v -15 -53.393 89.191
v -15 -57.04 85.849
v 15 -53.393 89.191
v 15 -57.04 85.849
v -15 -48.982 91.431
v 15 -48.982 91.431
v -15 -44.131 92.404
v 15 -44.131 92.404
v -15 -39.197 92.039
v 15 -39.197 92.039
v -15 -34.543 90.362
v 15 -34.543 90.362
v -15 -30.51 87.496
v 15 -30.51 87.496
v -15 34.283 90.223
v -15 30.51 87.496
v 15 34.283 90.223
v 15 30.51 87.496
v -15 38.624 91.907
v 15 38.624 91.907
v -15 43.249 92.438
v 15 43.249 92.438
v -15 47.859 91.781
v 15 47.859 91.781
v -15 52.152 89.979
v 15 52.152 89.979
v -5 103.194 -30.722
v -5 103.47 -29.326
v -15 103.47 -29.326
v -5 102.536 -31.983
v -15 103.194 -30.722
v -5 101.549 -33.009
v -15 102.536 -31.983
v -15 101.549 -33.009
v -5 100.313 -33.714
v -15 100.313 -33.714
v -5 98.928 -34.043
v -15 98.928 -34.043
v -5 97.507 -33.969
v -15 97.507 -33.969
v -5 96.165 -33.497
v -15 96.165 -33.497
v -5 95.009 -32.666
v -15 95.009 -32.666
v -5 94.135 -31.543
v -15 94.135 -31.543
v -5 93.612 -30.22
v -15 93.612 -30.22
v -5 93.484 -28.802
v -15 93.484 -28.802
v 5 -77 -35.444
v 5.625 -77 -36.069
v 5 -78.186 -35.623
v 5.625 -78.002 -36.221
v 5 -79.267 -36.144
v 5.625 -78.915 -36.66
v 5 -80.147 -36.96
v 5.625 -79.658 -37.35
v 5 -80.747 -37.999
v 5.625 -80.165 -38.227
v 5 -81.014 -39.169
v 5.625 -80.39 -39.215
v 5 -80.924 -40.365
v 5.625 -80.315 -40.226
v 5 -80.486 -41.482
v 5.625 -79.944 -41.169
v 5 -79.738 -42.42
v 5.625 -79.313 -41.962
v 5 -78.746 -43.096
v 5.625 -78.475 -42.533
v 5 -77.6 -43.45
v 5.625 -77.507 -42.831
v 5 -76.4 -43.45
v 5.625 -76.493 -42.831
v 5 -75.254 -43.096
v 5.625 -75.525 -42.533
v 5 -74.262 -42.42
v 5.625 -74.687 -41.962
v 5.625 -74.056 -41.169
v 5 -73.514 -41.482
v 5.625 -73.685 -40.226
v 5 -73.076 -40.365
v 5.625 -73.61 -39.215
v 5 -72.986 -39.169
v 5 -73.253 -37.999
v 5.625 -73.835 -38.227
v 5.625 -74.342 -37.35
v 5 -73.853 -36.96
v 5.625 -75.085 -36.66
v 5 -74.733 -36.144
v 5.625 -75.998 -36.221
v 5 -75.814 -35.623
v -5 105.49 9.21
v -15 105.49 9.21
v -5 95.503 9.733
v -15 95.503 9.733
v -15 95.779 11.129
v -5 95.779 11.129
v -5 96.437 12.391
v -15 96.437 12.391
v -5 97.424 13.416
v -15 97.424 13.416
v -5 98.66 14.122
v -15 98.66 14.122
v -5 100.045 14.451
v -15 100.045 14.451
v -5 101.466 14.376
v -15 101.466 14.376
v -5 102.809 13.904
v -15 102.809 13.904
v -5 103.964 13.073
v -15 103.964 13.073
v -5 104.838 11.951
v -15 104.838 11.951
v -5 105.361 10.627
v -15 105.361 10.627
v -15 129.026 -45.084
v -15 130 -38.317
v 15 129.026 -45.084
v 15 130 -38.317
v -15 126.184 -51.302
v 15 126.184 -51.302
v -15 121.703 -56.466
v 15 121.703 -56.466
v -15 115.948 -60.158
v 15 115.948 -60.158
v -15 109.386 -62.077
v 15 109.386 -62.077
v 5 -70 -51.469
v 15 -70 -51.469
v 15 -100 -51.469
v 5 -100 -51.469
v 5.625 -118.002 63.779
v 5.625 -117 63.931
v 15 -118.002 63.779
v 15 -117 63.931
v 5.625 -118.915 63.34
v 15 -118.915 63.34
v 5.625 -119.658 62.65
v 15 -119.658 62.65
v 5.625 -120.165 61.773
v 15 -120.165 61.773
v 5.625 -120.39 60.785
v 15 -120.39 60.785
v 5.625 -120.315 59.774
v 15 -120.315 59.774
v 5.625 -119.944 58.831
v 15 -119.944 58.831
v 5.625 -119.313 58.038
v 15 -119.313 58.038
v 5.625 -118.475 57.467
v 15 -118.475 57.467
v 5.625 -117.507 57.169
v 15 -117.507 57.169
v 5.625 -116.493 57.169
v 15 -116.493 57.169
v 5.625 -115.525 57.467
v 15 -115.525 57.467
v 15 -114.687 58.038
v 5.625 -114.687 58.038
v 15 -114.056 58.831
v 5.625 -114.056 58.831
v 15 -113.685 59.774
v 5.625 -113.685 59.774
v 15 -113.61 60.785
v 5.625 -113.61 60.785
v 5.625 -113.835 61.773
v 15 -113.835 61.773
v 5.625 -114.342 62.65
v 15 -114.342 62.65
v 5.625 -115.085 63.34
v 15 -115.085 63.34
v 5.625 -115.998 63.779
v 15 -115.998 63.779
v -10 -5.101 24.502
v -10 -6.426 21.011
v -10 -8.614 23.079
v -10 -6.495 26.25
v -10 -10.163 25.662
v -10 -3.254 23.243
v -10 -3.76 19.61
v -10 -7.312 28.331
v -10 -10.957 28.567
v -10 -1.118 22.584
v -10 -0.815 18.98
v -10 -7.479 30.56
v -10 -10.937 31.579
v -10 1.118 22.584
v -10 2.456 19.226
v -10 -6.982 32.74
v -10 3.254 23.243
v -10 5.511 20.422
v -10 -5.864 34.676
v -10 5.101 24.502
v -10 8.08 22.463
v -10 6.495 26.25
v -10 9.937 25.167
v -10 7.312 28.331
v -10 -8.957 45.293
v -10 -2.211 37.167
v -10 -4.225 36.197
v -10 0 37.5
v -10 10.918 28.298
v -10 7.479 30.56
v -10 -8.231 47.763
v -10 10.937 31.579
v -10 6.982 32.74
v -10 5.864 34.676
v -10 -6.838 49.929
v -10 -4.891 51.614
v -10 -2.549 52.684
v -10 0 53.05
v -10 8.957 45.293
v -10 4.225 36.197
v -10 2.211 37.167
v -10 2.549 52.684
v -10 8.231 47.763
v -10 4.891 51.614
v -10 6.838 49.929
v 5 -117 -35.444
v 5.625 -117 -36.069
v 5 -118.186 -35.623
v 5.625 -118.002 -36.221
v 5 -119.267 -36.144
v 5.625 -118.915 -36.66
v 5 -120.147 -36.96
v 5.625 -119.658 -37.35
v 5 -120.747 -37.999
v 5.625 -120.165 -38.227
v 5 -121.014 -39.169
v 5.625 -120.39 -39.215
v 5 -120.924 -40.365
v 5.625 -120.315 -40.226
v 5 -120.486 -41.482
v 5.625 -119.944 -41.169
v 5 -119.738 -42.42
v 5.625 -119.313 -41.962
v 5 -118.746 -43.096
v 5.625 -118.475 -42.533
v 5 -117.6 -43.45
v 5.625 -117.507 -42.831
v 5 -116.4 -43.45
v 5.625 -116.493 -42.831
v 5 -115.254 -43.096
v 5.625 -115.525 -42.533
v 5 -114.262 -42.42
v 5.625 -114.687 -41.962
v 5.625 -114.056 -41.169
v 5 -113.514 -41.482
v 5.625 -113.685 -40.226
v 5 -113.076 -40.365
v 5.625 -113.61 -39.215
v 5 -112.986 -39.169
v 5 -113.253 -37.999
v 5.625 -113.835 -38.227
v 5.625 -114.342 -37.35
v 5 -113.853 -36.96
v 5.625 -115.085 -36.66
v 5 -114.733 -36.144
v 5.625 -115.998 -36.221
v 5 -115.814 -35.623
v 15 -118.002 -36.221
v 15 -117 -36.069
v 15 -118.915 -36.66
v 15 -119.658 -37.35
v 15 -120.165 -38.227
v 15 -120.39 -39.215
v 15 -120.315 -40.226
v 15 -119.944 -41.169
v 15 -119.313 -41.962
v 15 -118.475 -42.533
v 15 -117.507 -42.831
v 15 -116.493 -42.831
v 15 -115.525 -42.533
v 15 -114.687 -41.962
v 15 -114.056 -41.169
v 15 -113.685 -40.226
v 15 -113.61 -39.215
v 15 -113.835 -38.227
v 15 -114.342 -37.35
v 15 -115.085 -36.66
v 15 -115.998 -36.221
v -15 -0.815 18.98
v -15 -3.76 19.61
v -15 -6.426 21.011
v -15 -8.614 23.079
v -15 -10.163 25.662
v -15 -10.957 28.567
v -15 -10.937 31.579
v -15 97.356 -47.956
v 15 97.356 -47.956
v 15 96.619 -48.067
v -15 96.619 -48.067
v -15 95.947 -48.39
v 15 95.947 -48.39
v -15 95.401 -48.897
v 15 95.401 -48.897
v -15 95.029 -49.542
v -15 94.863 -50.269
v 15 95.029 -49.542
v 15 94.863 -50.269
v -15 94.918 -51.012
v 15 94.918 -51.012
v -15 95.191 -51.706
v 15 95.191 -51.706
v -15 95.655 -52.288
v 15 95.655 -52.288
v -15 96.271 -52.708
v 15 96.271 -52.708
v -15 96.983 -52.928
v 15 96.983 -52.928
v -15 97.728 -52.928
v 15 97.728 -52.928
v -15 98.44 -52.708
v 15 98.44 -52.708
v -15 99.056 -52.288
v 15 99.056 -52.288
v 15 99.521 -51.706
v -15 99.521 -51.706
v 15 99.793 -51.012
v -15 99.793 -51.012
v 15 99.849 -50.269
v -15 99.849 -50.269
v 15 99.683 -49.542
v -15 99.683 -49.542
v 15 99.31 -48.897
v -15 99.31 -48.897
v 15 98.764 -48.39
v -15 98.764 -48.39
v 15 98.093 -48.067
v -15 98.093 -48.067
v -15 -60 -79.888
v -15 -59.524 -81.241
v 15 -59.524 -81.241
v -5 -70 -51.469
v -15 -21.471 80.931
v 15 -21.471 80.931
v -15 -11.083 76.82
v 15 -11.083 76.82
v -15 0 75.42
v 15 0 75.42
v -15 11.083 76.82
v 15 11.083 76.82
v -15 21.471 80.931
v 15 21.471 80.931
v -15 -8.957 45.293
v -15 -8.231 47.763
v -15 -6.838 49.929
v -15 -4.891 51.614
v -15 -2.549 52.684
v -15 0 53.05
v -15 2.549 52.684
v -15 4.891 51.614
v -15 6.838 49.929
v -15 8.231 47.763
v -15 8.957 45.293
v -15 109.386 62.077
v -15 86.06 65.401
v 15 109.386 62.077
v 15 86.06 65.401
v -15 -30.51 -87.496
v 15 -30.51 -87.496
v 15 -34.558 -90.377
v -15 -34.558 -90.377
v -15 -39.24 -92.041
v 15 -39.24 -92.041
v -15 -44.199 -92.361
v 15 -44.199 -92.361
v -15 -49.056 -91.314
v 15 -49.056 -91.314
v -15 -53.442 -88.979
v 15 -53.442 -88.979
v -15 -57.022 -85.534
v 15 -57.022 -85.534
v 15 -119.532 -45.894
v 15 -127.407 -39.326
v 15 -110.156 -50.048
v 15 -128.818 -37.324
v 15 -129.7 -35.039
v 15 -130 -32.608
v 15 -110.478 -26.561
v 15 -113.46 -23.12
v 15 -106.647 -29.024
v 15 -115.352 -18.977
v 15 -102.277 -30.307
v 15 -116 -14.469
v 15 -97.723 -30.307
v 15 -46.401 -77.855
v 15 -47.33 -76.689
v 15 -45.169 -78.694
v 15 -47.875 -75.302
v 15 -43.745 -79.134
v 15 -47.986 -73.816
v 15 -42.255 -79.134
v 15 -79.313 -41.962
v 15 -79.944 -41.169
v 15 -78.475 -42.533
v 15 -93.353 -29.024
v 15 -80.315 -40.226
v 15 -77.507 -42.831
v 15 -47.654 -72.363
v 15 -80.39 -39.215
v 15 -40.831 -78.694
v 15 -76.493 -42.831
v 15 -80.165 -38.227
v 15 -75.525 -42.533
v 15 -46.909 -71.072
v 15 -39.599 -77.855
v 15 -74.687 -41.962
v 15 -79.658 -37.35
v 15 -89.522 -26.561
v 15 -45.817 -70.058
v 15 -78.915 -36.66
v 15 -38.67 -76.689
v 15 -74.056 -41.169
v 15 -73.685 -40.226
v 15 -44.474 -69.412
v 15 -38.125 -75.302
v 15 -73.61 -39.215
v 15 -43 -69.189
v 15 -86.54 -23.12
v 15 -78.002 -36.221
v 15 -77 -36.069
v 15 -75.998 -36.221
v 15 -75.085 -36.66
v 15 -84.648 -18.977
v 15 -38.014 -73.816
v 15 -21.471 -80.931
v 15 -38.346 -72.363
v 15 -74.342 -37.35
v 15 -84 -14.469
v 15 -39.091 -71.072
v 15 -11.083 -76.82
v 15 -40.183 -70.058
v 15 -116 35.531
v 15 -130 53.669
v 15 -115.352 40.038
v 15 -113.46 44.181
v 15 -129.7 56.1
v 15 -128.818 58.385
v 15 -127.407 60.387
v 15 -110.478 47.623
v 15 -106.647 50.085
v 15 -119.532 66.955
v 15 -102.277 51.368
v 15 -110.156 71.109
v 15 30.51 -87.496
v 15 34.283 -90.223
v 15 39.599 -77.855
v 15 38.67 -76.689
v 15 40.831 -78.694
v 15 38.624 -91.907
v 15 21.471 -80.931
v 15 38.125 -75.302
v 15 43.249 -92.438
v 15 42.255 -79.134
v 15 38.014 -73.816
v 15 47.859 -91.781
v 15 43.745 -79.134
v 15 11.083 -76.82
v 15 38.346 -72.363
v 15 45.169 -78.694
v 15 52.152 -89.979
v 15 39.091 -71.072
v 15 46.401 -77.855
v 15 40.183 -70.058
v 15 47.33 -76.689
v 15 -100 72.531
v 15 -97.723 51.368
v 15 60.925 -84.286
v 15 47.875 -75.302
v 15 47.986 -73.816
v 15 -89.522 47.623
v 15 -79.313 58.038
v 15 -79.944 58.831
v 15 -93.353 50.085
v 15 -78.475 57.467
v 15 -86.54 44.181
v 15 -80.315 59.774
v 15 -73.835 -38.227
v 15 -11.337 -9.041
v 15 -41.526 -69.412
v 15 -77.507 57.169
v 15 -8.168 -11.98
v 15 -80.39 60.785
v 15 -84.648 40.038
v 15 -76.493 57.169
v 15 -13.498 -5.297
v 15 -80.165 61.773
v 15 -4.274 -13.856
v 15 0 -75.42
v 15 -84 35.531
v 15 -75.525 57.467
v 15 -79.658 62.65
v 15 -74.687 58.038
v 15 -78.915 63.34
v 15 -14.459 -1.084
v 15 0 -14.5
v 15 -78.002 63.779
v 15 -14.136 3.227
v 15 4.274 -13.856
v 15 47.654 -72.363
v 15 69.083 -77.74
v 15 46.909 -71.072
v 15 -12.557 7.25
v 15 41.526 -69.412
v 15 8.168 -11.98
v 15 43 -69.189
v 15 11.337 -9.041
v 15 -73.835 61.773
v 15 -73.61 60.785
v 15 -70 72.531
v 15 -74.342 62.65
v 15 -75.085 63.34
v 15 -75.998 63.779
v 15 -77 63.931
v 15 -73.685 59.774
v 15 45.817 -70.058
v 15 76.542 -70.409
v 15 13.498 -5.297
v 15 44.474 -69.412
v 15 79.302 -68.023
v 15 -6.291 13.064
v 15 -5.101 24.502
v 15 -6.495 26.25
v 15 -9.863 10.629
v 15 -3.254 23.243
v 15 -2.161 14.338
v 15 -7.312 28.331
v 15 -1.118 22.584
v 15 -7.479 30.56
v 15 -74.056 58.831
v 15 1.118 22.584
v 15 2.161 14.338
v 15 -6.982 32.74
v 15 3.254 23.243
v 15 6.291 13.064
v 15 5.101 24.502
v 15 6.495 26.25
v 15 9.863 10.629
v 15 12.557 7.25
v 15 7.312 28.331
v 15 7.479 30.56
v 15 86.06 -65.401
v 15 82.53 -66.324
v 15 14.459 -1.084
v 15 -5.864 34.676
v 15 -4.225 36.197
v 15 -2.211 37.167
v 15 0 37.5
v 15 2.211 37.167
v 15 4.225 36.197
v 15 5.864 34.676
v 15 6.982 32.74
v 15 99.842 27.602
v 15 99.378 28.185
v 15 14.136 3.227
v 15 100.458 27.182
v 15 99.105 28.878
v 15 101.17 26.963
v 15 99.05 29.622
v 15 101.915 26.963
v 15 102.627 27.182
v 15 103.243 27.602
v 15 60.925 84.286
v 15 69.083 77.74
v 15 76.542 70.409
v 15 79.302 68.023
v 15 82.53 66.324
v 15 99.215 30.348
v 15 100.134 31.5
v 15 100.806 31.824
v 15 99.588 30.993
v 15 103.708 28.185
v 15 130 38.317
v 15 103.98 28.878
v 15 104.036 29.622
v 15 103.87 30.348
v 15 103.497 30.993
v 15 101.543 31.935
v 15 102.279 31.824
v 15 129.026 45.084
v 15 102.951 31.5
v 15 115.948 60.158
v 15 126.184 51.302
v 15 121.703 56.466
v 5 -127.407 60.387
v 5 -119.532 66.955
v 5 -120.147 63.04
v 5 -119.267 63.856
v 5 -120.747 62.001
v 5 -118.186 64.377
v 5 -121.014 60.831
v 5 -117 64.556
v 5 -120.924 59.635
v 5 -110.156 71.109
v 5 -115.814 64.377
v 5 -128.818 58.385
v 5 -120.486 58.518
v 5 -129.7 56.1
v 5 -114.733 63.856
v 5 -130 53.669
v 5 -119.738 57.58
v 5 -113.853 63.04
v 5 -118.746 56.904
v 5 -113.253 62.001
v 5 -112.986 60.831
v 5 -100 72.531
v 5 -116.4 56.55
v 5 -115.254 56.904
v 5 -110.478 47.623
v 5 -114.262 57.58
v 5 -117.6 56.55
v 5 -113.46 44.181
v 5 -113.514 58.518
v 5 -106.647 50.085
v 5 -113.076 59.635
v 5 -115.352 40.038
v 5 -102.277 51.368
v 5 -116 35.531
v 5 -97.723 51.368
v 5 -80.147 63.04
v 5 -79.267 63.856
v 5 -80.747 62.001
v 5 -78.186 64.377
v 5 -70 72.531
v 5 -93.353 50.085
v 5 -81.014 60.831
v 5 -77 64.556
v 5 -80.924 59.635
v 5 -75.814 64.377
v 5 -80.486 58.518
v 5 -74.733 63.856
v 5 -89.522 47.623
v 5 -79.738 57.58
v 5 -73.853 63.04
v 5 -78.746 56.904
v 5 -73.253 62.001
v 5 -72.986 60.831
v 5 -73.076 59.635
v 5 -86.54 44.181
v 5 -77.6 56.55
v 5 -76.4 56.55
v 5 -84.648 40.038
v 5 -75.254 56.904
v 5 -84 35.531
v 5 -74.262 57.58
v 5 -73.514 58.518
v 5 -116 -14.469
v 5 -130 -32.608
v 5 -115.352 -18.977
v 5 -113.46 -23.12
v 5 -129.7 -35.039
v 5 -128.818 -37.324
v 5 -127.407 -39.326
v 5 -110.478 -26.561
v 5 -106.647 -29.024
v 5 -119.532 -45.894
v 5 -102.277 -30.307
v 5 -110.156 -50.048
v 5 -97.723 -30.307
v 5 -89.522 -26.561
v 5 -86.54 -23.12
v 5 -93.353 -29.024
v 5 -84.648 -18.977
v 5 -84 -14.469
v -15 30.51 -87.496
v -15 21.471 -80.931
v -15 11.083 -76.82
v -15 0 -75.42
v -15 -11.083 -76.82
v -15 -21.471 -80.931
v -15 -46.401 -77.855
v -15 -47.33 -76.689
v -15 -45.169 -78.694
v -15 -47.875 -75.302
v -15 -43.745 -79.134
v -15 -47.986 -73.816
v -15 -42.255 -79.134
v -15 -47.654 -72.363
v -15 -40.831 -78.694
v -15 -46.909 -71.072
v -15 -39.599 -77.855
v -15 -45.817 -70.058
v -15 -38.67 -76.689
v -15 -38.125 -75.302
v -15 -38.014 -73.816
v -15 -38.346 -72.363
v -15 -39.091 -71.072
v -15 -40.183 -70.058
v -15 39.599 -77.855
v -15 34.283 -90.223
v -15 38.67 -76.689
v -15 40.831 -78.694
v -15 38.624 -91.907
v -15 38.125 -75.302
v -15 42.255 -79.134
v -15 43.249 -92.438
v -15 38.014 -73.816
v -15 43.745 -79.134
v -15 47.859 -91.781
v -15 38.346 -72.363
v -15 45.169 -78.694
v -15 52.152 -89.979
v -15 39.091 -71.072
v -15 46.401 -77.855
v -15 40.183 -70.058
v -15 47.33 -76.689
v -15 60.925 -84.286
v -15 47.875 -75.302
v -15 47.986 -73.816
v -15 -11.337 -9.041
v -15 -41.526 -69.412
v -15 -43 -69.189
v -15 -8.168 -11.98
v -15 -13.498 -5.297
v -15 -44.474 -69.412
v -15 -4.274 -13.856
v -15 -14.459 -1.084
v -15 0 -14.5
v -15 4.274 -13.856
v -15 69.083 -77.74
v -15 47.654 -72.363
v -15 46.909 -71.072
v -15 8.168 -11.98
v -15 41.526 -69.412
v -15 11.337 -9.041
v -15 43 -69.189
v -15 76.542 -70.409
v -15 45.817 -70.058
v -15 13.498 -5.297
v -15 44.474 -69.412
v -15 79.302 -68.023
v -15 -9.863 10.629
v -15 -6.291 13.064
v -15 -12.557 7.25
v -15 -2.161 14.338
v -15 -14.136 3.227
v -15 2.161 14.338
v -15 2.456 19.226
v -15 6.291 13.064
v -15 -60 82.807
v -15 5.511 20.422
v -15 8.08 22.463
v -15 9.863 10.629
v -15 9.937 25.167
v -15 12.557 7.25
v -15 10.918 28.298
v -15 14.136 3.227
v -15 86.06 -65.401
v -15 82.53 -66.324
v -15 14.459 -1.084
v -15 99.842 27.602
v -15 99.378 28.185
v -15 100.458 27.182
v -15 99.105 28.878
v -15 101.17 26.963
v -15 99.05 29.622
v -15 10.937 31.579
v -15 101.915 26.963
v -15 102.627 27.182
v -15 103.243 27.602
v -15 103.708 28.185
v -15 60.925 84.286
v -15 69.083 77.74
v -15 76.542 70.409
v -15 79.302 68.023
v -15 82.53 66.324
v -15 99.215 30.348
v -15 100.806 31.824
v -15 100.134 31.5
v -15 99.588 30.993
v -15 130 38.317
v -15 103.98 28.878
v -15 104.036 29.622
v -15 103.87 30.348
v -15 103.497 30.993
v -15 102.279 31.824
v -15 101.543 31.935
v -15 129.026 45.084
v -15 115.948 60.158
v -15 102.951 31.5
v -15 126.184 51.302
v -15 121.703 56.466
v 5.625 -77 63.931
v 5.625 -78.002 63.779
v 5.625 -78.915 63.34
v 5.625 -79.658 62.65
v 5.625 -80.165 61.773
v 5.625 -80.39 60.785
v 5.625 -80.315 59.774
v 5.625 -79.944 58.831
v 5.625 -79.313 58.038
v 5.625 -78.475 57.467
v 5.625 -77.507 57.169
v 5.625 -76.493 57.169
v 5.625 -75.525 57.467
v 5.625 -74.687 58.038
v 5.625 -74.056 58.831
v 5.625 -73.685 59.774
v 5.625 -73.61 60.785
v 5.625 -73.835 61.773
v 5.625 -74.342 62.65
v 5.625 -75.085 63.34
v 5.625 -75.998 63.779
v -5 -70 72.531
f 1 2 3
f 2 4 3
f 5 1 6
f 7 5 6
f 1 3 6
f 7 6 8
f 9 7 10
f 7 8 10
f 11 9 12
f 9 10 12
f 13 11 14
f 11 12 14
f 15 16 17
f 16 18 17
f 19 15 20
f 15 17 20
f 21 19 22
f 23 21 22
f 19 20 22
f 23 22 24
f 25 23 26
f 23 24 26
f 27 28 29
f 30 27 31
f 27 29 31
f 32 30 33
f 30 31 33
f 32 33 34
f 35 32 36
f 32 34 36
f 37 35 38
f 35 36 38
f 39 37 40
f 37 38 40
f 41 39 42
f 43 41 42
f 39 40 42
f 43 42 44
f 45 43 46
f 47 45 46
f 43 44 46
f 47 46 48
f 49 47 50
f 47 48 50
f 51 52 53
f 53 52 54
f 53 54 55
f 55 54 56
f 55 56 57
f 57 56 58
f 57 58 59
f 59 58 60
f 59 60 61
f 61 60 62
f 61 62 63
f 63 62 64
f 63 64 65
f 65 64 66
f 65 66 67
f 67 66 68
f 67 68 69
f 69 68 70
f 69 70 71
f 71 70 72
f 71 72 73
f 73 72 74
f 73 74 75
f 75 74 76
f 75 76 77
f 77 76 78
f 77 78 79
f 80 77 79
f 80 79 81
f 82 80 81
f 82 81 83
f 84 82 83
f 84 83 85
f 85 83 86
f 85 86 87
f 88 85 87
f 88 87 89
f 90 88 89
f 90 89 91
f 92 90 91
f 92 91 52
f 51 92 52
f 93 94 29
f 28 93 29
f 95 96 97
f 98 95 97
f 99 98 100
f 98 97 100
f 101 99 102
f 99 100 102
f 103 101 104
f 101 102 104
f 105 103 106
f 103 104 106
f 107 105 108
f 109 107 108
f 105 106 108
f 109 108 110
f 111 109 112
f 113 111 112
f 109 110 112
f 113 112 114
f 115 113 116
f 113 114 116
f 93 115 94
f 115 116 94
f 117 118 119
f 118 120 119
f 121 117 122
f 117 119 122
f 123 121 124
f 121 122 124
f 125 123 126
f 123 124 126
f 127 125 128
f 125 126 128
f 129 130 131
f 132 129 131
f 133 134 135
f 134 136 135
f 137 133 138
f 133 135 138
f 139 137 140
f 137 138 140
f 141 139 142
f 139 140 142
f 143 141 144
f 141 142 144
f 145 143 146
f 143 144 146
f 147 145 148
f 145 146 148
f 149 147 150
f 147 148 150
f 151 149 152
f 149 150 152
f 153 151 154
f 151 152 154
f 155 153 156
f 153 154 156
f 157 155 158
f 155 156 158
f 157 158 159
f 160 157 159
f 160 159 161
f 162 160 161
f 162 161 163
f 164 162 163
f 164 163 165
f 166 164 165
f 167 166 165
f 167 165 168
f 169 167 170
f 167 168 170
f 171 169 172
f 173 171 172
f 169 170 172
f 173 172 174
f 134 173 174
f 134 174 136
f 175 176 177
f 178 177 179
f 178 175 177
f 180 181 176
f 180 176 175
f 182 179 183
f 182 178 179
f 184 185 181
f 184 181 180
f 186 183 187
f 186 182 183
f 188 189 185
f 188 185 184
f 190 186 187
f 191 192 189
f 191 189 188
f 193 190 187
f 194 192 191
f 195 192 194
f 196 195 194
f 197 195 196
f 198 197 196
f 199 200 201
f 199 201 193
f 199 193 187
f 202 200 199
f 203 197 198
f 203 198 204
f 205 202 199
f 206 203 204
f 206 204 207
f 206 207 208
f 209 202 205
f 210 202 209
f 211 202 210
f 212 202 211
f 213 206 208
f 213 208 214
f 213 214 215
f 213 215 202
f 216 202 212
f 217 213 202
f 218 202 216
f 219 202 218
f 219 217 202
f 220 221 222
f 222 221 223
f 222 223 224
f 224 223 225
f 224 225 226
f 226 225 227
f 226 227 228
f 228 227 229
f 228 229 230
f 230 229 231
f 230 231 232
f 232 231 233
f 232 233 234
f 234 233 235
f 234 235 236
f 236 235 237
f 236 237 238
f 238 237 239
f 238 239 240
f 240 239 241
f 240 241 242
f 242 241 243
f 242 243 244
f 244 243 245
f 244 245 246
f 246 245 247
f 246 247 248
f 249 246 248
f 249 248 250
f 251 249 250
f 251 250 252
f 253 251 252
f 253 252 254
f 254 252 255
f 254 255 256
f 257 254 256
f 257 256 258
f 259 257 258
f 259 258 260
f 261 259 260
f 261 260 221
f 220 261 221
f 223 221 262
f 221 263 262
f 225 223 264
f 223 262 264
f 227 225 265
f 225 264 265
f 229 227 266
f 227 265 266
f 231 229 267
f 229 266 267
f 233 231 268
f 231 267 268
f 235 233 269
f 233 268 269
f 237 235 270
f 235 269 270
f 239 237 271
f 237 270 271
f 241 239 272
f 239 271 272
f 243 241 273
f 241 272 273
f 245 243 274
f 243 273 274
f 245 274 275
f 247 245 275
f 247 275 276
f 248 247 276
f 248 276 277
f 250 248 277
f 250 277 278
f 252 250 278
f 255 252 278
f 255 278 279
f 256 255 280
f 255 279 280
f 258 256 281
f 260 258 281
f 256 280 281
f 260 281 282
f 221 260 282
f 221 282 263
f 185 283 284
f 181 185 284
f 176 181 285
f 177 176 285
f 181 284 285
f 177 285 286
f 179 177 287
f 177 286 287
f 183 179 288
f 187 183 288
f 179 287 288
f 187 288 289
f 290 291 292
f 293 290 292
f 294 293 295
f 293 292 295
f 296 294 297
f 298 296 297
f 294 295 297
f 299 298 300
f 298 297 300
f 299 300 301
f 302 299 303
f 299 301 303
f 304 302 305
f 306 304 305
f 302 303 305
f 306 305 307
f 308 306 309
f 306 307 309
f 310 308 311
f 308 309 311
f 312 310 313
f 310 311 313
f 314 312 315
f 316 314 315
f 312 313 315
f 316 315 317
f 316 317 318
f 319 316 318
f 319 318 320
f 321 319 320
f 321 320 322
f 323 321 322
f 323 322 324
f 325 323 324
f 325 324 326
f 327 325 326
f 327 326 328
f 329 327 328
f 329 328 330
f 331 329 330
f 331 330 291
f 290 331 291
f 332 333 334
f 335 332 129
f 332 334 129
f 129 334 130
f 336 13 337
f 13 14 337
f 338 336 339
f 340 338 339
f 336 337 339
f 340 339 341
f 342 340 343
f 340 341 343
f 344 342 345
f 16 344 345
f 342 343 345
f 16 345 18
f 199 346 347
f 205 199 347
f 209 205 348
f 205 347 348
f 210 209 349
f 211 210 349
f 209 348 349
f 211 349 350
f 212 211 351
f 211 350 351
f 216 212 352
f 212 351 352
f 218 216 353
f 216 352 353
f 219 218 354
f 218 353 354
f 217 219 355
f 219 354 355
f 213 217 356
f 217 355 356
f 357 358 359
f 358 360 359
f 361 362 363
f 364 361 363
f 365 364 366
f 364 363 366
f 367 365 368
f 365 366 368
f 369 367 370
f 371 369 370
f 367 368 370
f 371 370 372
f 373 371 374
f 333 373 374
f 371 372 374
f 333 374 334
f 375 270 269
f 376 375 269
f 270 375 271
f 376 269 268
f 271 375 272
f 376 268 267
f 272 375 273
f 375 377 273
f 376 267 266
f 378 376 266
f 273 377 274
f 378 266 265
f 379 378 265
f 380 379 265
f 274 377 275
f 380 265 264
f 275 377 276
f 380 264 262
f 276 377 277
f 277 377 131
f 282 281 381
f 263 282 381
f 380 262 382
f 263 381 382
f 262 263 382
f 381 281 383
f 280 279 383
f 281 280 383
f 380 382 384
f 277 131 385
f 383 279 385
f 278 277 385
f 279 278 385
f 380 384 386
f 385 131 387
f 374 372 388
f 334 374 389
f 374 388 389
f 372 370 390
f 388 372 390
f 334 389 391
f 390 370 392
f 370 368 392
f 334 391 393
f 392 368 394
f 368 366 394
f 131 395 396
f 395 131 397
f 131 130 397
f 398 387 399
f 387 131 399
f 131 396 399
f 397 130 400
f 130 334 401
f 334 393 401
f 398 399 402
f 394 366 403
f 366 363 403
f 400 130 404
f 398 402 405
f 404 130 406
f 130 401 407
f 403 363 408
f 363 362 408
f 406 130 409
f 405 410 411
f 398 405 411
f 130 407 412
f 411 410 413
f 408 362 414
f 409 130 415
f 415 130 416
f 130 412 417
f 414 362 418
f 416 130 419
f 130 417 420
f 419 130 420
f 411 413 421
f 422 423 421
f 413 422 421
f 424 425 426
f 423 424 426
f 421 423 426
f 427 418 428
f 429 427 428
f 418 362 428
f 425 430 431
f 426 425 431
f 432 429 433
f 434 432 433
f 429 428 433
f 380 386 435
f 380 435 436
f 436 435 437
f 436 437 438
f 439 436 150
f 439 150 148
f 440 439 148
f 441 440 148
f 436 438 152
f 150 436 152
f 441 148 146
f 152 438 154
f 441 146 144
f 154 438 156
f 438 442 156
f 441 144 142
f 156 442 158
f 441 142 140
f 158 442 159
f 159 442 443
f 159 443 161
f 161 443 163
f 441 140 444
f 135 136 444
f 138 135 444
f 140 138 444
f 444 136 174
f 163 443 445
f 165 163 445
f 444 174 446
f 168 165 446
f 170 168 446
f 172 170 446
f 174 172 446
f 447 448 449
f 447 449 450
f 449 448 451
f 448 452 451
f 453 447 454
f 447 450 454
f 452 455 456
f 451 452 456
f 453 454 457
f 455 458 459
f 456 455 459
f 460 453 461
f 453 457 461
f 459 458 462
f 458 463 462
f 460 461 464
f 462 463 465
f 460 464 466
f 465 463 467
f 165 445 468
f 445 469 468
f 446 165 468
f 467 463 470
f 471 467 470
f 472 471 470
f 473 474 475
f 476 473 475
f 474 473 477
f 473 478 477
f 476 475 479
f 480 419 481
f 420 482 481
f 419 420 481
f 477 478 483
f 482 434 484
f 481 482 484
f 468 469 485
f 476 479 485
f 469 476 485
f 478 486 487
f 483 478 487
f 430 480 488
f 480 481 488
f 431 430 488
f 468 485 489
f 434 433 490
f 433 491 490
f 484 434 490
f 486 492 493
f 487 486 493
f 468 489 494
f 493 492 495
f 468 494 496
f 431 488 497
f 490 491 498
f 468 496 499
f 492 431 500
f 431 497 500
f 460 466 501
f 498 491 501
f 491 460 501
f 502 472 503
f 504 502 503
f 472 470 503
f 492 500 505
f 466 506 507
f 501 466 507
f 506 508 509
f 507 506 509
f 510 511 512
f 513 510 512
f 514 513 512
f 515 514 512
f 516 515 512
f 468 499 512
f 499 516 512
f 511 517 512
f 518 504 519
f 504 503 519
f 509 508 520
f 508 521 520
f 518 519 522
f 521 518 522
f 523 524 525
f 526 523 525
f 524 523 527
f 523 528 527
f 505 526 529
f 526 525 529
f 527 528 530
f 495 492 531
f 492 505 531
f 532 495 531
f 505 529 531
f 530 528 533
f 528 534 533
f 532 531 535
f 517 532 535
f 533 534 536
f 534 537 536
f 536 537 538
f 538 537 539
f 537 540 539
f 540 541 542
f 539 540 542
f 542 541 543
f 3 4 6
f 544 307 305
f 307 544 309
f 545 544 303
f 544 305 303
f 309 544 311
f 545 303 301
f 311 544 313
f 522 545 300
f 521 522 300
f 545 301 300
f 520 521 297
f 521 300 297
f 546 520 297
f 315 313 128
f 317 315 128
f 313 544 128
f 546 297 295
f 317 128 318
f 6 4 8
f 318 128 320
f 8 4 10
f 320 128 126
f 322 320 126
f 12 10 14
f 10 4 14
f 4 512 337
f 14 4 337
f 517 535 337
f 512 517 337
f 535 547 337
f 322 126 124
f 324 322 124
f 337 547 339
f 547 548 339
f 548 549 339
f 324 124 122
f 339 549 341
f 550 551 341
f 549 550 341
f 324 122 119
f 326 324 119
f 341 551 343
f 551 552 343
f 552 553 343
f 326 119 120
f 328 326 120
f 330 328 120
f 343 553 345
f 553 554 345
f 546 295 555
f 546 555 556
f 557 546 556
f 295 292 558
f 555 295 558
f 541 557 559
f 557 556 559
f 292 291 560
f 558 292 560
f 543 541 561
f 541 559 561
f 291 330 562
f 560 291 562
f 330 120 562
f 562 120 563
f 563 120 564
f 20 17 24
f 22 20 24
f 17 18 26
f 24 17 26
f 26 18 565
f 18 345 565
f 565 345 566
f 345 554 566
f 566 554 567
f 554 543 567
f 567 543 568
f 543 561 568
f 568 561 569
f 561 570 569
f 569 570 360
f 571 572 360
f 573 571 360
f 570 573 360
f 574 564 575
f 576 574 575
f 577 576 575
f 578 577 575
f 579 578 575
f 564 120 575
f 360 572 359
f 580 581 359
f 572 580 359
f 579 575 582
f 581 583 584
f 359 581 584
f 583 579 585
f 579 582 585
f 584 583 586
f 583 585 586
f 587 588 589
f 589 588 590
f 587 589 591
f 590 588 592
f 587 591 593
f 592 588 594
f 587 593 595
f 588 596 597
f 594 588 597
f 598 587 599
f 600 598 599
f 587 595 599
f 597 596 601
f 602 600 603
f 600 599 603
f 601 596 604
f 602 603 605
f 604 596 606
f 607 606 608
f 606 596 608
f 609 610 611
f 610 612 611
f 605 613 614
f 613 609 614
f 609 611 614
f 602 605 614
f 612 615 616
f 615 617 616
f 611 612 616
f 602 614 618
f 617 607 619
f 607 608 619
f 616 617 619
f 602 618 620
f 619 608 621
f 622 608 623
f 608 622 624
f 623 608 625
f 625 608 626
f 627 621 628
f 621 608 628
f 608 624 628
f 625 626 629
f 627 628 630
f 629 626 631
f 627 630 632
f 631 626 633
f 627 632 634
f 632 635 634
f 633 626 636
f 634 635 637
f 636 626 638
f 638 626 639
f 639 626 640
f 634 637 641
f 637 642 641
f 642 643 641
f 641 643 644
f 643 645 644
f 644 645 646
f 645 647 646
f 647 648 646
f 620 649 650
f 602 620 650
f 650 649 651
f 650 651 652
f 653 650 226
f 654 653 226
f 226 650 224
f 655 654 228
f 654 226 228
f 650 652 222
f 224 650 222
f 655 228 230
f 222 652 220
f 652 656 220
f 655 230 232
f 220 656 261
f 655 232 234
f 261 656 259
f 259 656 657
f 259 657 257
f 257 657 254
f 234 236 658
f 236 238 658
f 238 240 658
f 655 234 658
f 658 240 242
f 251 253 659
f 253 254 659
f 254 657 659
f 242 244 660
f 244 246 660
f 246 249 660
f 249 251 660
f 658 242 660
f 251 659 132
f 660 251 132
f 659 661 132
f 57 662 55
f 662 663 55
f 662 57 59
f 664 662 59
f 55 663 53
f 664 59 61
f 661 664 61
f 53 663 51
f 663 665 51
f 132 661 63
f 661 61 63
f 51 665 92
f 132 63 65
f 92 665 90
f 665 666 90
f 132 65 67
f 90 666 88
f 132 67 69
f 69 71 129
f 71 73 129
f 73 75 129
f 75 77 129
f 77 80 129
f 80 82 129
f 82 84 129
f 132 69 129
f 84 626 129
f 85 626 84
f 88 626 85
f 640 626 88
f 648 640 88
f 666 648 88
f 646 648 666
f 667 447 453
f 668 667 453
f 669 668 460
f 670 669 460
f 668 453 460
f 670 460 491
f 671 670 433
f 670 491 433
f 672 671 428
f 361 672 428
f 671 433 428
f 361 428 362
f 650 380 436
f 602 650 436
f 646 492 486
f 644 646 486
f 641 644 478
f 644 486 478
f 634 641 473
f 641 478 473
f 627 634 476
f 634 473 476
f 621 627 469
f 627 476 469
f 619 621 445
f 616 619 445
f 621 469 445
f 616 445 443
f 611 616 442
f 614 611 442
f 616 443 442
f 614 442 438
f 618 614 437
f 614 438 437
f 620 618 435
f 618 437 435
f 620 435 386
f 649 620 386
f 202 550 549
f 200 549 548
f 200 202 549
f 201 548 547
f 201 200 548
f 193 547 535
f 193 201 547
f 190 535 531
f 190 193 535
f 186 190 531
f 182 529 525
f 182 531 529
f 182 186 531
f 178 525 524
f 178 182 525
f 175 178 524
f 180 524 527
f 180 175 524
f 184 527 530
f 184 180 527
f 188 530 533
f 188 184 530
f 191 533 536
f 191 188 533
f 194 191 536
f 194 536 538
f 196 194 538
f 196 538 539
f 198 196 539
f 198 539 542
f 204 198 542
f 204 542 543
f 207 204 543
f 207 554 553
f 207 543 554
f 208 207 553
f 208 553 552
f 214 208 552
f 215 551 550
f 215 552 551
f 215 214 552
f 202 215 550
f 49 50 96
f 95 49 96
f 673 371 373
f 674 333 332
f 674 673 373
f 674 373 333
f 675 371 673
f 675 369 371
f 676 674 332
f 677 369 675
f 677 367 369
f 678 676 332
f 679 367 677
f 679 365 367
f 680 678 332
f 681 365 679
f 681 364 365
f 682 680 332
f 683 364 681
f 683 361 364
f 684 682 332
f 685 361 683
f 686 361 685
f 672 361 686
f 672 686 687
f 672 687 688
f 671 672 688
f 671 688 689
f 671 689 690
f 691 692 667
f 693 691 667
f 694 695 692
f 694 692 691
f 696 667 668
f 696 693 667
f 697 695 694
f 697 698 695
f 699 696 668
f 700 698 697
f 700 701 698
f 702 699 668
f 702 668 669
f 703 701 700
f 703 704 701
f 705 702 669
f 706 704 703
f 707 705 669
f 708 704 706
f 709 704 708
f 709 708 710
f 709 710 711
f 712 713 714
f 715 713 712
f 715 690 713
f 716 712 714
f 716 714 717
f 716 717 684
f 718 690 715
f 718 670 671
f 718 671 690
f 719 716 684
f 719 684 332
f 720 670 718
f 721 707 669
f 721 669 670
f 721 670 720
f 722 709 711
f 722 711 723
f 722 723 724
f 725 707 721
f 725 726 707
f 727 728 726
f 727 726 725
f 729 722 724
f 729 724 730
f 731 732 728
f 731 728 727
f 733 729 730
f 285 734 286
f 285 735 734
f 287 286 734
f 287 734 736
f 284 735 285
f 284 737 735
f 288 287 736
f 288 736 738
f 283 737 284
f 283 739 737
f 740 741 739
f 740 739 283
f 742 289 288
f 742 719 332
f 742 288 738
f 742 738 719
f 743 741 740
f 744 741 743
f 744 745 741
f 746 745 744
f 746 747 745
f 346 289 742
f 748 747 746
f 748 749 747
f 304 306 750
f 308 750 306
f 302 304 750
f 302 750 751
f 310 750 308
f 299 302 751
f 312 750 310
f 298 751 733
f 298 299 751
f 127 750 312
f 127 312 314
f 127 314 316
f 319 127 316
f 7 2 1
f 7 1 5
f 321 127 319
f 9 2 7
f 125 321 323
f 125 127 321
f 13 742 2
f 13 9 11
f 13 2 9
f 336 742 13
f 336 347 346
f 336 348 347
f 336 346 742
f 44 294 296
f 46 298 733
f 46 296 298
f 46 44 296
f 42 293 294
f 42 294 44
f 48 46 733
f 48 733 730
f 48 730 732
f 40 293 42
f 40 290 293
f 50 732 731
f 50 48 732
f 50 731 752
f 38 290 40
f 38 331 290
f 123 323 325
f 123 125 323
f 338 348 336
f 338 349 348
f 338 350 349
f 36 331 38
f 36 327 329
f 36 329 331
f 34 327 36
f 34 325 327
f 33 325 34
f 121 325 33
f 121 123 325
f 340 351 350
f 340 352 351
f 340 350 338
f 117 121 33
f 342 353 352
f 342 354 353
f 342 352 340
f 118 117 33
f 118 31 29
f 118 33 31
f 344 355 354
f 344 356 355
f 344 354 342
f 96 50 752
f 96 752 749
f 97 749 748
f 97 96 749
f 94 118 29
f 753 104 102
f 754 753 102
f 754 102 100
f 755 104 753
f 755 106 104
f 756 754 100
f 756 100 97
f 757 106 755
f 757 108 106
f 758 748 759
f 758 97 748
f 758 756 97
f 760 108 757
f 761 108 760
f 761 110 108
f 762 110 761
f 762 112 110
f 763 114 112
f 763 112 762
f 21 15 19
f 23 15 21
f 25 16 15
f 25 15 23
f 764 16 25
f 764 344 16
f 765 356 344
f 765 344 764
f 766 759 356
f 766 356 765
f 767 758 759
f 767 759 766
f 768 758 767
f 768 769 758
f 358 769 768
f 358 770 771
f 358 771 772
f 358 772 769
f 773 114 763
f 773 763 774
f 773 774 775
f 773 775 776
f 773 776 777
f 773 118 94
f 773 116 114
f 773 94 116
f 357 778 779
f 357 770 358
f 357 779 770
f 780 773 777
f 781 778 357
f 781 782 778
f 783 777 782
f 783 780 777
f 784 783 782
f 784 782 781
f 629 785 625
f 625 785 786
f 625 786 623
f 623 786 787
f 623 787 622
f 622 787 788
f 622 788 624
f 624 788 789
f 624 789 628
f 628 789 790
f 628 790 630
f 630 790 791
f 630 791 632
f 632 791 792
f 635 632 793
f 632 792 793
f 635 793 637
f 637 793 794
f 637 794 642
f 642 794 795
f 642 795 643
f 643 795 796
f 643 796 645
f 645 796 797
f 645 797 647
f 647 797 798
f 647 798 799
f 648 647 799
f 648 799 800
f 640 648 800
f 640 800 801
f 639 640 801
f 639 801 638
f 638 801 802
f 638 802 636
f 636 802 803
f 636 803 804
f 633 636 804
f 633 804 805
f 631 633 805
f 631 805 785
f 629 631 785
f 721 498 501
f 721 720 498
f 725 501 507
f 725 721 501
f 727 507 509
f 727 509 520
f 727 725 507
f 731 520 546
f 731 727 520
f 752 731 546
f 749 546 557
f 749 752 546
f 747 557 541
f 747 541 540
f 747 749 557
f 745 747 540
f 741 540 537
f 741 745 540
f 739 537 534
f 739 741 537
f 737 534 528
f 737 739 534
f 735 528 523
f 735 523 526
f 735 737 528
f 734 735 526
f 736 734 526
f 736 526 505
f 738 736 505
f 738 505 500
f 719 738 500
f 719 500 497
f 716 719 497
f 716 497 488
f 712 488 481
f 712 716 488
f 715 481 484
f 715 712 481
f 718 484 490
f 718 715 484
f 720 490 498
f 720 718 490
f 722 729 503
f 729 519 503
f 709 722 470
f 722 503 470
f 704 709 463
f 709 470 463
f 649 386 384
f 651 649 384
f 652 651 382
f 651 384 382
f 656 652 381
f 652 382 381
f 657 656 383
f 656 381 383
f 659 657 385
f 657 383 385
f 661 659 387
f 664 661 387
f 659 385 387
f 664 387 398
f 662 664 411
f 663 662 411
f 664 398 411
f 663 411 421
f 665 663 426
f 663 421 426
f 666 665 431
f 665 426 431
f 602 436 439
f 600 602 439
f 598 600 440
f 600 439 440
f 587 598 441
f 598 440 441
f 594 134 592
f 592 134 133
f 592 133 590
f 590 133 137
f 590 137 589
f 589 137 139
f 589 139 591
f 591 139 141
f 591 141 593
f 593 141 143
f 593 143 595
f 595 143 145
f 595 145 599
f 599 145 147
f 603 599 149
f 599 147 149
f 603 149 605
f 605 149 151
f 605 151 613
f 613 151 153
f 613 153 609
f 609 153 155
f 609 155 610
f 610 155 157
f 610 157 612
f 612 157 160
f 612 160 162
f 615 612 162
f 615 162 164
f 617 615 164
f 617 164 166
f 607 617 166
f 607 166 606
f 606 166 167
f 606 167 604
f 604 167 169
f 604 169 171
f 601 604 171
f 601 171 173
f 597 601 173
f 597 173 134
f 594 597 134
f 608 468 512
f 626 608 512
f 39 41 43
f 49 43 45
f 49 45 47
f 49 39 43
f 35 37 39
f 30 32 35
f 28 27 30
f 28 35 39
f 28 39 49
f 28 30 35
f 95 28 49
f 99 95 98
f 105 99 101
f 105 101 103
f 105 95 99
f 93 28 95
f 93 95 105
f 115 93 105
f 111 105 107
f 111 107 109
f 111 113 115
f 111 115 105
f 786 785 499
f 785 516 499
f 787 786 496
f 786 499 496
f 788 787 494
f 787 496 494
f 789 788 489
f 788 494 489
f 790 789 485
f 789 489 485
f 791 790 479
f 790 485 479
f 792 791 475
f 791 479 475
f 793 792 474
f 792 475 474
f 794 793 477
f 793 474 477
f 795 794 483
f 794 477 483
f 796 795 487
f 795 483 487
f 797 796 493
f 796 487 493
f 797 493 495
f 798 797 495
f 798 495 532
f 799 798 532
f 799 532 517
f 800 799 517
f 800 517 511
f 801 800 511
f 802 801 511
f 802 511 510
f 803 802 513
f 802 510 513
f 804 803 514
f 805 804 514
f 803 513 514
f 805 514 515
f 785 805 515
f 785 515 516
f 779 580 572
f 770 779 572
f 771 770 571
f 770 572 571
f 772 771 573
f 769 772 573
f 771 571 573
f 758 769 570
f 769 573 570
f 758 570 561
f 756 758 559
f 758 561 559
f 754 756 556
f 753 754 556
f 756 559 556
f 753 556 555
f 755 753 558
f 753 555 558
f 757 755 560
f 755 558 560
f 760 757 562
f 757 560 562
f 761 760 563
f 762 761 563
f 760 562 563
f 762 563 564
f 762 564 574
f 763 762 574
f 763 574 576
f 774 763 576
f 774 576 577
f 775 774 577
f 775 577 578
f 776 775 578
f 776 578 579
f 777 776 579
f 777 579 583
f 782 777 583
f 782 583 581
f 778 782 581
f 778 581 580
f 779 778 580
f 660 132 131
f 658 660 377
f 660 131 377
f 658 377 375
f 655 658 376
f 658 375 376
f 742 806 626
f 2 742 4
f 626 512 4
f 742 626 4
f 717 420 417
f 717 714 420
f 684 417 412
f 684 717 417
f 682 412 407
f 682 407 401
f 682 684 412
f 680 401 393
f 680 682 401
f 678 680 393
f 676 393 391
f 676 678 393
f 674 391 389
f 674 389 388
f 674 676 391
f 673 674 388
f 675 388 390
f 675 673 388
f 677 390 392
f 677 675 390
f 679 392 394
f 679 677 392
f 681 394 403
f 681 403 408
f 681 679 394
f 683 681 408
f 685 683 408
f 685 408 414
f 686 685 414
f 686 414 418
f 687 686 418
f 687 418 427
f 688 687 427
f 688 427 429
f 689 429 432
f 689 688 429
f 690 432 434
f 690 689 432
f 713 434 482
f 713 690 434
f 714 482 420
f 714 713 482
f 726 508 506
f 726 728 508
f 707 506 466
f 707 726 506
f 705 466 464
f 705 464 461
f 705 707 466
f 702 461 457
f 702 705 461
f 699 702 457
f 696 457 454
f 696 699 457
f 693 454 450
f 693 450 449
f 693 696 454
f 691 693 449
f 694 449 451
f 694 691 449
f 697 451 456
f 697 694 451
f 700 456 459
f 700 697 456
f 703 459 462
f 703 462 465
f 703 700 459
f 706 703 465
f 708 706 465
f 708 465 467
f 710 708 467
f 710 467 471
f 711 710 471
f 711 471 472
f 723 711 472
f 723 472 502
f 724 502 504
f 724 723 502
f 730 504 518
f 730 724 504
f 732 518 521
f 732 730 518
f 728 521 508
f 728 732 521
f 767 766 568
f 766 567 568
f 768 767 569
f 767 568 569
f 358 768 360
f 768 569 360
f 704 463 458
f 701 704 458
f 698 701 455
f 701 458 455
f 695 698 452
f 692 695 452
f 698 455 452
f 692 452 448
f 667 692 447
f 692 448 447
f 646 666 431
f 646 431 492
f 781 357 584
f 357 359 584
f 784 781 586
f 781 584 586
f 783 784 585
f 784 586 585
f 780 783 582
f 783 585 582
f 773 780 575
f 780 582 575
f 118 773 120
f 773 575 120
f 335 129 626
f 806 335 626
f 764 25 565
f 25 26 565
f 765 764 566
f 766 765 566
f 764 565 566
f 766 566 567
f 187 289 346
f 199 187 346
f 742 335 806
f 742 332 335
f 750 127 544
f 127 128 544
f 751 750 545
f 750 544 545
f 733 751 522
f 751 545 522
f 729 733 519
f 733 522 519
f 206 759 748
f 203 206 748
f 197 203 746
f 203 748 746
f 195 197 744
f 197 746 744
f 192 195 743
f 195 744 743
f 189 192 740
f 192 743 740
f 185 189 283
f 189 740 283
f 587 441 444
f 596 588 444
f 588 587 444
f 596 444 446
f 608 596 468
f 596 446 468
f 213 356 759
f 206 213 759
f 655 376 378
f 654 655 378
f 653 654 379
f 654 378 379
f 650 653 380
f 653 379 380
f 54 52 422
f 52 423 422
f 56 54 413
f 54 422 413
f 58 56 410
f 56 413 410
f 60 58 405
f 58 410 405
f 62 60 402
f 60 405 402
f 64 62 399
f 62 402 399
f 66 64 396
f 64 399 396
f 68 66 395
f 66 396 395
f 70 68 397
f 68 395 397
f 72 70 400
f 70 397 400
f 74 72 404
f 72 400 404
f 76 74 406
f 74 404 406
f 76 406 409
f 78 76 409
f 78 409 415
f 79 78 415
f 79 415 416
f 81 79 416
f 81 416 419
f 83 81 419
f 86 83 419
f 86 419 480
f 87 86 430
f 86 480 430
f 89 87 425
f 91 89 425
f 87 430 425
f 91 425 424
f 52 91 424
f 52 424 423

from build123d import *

# Parameters (mm, degrees)
SZKIC1_R                         = 14.5
SZKIC1_R_2                       = 5
DODANIE_WYCI_GNI_CIE1_DEPTH      = 15
OTW_R_GWINTOWANY_M61_D           = 5
WYTNIJ_WYCI_GNI_CIE2_DEPTH       = 10
WYTNIJ_WYCI_GNI_CIE4_START       = 20
WYTNIJ_WYCI_GNI_CIE4_DEPTH       = 20
SFAZOWANIE4_SIZE                 = 10
SZKIC17_R                        = 7.5
WYTNIJ_WYCI_GNI_CIE5_DEPTH       = 5
SZKIC17_5_R                      = 7.5
WYTNIJ_WYCI_GNI_CIE6_DEPTH       = 163.311542951
OTW_R_GWINTOWANY_M81_D           = 6.8
OTW_R_GWINTOWANY_M81_DEPTH       = 16.207073895
OTW_R_GWINTOWANY_M81_CSINK_D     = 8.05
OTW_R_GWINTOWANY_M81_CSINK_ANGLE = 90
OTW_R_GWINTOWANY_M81_TIP         = 2.042926105


with BuildPart() as part:
    # Szkic1 → Dodanie-wyciągnięcie1 (new, symmetric)
    with BuildSketch(Plane(origin=(0, 0, 0), x_dir=(0, 0, -1), z_dir=(1, 0, 0))):
        with BuildLine():
            Line((-72.530533194, -70), (-85.848604083, -57.040111879))
            ThreePointArc((-85.848604083, -57.040111879), (-92.404294481, -44.130927243), (-87.495806927, -30.50995538))
            ThreePointArc((-87.495806927, -30.50995538), (-75.419960244, 0), (-87.495806927, 30.50995538))
            ThreePointArc((-87.495806927, 30.50995538), (-92.32041193, 40.919666146), (-89.978943384, 52.151603499))
            ThreePointArc((-89.978943384, 52.151603499), (-81.115709466, 65.086416999), (-70.408575711, 76.541704099))
            ThreePointArc((-70.408575711, 76.541704099), (-67.080888035, 80.867469231), (-65.40069858, 86.060032436))
            Line((-65.40069858, 86.060032436), (-62.076569761, 109.385977671))
            ThreePointArc((-62.076569761, 109.385977671), (-54.044566654, 124.12820267), (-38.316621209, 130))
            Line((-38.316621209, 130), (38.316621209, 130))
            ThreePointArc((38.316621209, 130), (54.044566654, 124.12820267), (62.076569761, 109.385977671))
            Line((62.076569761, 109.385977671), (65.40069858, 86.060032436))
            ThreePointArc((65.40069858, 86.060032436), (67.080888035, 80.867469231), (70.408575711, 76.541704099))
            ThreePointArc((70.408575711, 76.541704099), (81.115709466, 65.086416999), (89.978943384, 52.151603499))
            ThreePointArc((89.978943384, 52.151603499), (92.32041193, 40.919666146), (87.495806927, 30.50995538))
            ThreePointArc((87.495806927, 30.50995538), (75.419960244, 0), (87.495806927, -30.50995538))
            ThreePointArc((87.495806927, -30.50995538), (92.006314233, -46.663708643), (81.240664282, -59.524081957))
            Line((81.240664282, -59.524081957), (51.469466806, -70))
            Line((51.469466806, -70), (51.469466806, -100))
            ThreePointArc((51.469466806, -100), (48.29757558, -114.988630917), (39.325734007, -127.407407407))
            ThreePointArc((39.325734007, -127.407407407), (36.208235452, -129.329364235), (32.607823953, -130))
            Line((32.607823953, -130), (14.469466806, -130))
            Line((14.469466806, -130), (-35.530533194, -130))
            Line((-35.530533194, -130), (-53.668890342, -130))
            ThreePointArc((-53.668890342, -130), (-57.269301841, -129.329364235), (-60.386800396, -127.407407407))
            ThreePointArc((-60.386800396, -127.407407407), (-69.358641969, -114.988630917), (-72.530533194, -100))
            Line((-72.530533194, -100), (-72.530533194, -70))
        make_face()
        Circle(SZKIC1_R, mode=Mode.SUBTRACT)
        with Locations((74.189369185, -43)):
            Circle(SZKIC1_R_2, mode=Mode.SUBTRACT)
        with Locations((74.189369185, 43)):
            Circle(SZKIC1_R_2, mode=Mode.SUBTRACT)
        with BuildLine():
            Line((14.469466806, -84), (-35.530533194, -84))
            ThreePointArc((-35.530533194, -84), (-51.530533194, -100), (-35.530533194, -116))
            Line((-35.530533194, -116), (14.469466806, -116))
            ThreePointArc((14.469466806, -116), (30.469466806, -100), (14.469466806, -84))
        make_face(mode=Mode.SUBTRACT)
    extrude(amount=DODANIE_WYCI_GNI_CIE1_DEPTH, both=True)

    # Otwór gwintowany M61 (through all)
    with Locations(Plane(origin=(-15, 0, 0), x_dir=(0, 0, -1), z_dir=(-1, 0, 0))):
        with Locations((-29.434757864, -101.542610293), (50.455604917, -97.355733794)):
            Hole(OTW_R_GWINTOWANY_M61_D / 2)

    # Szkic12 → Wytnij-wyciągnięcie2 (cut)
    with BuildSketch(Plane(origin=(-15, 0, 0), x_dir=(0, 0, -1), z_dir=(1, 0, 0))):
        with BuildLine():
            Line((28.802174659, 93.483680258), (-9.732880373, 95.503216916))
            ThreePointArc((-9.732880373, 95.503216916), (-14.464348266, 100.758044371), (-9.209520811, 105.489512264))
            Line((-9.209520811, 105.489512264), (29.325534221, 103.469975605))
            ThreePointArc((29.325534221, 103.469975605), (34.057002114, 98.21514815), (28.802174659, 93.483680258))
        make_face()
    extrude(amount=WYTNIJ_WYCI_GNI_CIE2_DEPTH, mode=Mode.SUBTRACT)

    # Szkic16 → Wytnij-wyciągnięcie4 (cut)
    with BuildSketch(Plane(origin=(-15, 0, 0), x_dir=(0, 0, -1), z_dir=(1, 0, 0)).offset(WYTNIJ_WYCI_GNI_CIE4_START)):
        with BuildLine():
            Line((-53.668890342, -130), (32.607823953, -130))
            ThreePointArc((32.607823953, -130), (36.208235452, -129.329364235), (39.325734007, -127.407407407))
            ThreePointArc((39.325734007, -127.407407407), (48.29757558, -114.988630917), (51.469466806, -100))
            Line((51.469466806, -100), (51.469466806, -70))
            Line((51.469466806, -70), (-72.530533194, -70))
            Line((-72.530533194, -70), (-72.530533194, -100))
            ThreePointArc((-72.530533194, -100), (-69.358641969, -114.988630917), (-60.386800396, -127.407407407))
            ThreePointArc((-60.386800396, -127.407407407), (-57.269301841, -129.329364235), (-53.668890342, -130))
        make_face()
        with BuildLine():
            Line((-35.530533194, -116), (14.469466806, -116))
            ThreePointArc((14.469466806, -116), (30.469466806, -100), (14.469466806, -84))
            Line((14.469466806, -84), (-35.530533194, -84))
            ThreePointArc((-35.530533194, -84), (-51.530533194, -100), (-35.530533194, -116))
        make_face(mode=Mode.SUBTRACT)
    extrude(amount=-WYTNIJ_WYCI_GNI_CIE4_DEPTH, mode=Mode.SUBTRACT)

    # Sfazowanie4
    sfazowanie4_edges = [part.edges().sort_by_distance(p)[0] for p in [
        (-15, -70, 10.530533194),
    ]]
    chamfer(sfazowanie4_edges, length=SFAZOWANIE4_SIZE)

    # Szkic17 → Wytnij-wyciągnięcie5 (cut)
    with BuildSketch(Plane(origin=(-15, 0, 0), x_dir=(0, 0, -1), z_dir=(1, 0, 0))):
        with BuildLine():
            Line((-45.292857142, 8.957177033), (-31.578571428, 10.93666367))
            ThreePointArc((-31.578571428, 10.93666367), (-22.462605729, 8.080234378), (-18.98012619, -0.815402484))
            ThreePointArc((-18.98012619, -0.815402484), (-23.079412621, -8.614404816), (-31.578571429, -10.936663671))
            Line((-31.578571429, -10.936663671), (-45.292857143, -8.957177034))
            ThreePointArc((-45.292857143, -8.957177034), (-53.05, 0), (-45.292857142, 8.957177033))
        make_face()
        with Locations((-30, -1e-09)):
            Circle(SZKIC17_R, mode=Mode.SUBTRACT)
    extrude(amount=WYTNIJ_WYCI_GNI_CIE5_DEPTH, mode=Mode.SUBTRACT)

    # Szkic17<5> → Wytnij-wyciągnięcie6 (cut, through all)
    with BuildSketch(Plane(origin=(-15, 0, 0), x_dir=(0, 0, -1), z_dir=(1, 0, 0))):
        with Locations((-30, -1e-09)):
            Circle(SZKIC17_5_R)
    extrude(amount=WYTNIJ_WYCI_GNI_CIE6_DEPTH, mode=Mode.SUBTRACT)

    # Otwór gwintowany M81
    with Locations(Plane(origin=(5, -77, -39.469466806), x_dir=(0, 0, -1), z_dir=(-1, 0, 0))):
        with Locations((0, 0), (0, 40), (-100, 40), (-100, 0)):
            CounterSinkHole(OTW_R_GWINTOWANY_M81_D / 2, OTW_R_GWINTOWANY_M81_CSINK_D / 2, depth=OTW_R_GWINTOWANY_M81_DEPTH, counter_sink_angle=OTW_R_GWINTOWANY_M81_CSINK_ANGLE)
            with Locations((0, 0, -(OTW_R_GWINTOWANY_M81_DEPTH + OTW_R_GWINTOWANY_M81_TIP / 2))):  # 118° drill point
                Cone(0, OTW_R_GWINTOWANY_M81_D / 2, OTW_R_GWINTOWANY_M81_TIP, mode=Mode.SUBTRACT)


solid = part.part
